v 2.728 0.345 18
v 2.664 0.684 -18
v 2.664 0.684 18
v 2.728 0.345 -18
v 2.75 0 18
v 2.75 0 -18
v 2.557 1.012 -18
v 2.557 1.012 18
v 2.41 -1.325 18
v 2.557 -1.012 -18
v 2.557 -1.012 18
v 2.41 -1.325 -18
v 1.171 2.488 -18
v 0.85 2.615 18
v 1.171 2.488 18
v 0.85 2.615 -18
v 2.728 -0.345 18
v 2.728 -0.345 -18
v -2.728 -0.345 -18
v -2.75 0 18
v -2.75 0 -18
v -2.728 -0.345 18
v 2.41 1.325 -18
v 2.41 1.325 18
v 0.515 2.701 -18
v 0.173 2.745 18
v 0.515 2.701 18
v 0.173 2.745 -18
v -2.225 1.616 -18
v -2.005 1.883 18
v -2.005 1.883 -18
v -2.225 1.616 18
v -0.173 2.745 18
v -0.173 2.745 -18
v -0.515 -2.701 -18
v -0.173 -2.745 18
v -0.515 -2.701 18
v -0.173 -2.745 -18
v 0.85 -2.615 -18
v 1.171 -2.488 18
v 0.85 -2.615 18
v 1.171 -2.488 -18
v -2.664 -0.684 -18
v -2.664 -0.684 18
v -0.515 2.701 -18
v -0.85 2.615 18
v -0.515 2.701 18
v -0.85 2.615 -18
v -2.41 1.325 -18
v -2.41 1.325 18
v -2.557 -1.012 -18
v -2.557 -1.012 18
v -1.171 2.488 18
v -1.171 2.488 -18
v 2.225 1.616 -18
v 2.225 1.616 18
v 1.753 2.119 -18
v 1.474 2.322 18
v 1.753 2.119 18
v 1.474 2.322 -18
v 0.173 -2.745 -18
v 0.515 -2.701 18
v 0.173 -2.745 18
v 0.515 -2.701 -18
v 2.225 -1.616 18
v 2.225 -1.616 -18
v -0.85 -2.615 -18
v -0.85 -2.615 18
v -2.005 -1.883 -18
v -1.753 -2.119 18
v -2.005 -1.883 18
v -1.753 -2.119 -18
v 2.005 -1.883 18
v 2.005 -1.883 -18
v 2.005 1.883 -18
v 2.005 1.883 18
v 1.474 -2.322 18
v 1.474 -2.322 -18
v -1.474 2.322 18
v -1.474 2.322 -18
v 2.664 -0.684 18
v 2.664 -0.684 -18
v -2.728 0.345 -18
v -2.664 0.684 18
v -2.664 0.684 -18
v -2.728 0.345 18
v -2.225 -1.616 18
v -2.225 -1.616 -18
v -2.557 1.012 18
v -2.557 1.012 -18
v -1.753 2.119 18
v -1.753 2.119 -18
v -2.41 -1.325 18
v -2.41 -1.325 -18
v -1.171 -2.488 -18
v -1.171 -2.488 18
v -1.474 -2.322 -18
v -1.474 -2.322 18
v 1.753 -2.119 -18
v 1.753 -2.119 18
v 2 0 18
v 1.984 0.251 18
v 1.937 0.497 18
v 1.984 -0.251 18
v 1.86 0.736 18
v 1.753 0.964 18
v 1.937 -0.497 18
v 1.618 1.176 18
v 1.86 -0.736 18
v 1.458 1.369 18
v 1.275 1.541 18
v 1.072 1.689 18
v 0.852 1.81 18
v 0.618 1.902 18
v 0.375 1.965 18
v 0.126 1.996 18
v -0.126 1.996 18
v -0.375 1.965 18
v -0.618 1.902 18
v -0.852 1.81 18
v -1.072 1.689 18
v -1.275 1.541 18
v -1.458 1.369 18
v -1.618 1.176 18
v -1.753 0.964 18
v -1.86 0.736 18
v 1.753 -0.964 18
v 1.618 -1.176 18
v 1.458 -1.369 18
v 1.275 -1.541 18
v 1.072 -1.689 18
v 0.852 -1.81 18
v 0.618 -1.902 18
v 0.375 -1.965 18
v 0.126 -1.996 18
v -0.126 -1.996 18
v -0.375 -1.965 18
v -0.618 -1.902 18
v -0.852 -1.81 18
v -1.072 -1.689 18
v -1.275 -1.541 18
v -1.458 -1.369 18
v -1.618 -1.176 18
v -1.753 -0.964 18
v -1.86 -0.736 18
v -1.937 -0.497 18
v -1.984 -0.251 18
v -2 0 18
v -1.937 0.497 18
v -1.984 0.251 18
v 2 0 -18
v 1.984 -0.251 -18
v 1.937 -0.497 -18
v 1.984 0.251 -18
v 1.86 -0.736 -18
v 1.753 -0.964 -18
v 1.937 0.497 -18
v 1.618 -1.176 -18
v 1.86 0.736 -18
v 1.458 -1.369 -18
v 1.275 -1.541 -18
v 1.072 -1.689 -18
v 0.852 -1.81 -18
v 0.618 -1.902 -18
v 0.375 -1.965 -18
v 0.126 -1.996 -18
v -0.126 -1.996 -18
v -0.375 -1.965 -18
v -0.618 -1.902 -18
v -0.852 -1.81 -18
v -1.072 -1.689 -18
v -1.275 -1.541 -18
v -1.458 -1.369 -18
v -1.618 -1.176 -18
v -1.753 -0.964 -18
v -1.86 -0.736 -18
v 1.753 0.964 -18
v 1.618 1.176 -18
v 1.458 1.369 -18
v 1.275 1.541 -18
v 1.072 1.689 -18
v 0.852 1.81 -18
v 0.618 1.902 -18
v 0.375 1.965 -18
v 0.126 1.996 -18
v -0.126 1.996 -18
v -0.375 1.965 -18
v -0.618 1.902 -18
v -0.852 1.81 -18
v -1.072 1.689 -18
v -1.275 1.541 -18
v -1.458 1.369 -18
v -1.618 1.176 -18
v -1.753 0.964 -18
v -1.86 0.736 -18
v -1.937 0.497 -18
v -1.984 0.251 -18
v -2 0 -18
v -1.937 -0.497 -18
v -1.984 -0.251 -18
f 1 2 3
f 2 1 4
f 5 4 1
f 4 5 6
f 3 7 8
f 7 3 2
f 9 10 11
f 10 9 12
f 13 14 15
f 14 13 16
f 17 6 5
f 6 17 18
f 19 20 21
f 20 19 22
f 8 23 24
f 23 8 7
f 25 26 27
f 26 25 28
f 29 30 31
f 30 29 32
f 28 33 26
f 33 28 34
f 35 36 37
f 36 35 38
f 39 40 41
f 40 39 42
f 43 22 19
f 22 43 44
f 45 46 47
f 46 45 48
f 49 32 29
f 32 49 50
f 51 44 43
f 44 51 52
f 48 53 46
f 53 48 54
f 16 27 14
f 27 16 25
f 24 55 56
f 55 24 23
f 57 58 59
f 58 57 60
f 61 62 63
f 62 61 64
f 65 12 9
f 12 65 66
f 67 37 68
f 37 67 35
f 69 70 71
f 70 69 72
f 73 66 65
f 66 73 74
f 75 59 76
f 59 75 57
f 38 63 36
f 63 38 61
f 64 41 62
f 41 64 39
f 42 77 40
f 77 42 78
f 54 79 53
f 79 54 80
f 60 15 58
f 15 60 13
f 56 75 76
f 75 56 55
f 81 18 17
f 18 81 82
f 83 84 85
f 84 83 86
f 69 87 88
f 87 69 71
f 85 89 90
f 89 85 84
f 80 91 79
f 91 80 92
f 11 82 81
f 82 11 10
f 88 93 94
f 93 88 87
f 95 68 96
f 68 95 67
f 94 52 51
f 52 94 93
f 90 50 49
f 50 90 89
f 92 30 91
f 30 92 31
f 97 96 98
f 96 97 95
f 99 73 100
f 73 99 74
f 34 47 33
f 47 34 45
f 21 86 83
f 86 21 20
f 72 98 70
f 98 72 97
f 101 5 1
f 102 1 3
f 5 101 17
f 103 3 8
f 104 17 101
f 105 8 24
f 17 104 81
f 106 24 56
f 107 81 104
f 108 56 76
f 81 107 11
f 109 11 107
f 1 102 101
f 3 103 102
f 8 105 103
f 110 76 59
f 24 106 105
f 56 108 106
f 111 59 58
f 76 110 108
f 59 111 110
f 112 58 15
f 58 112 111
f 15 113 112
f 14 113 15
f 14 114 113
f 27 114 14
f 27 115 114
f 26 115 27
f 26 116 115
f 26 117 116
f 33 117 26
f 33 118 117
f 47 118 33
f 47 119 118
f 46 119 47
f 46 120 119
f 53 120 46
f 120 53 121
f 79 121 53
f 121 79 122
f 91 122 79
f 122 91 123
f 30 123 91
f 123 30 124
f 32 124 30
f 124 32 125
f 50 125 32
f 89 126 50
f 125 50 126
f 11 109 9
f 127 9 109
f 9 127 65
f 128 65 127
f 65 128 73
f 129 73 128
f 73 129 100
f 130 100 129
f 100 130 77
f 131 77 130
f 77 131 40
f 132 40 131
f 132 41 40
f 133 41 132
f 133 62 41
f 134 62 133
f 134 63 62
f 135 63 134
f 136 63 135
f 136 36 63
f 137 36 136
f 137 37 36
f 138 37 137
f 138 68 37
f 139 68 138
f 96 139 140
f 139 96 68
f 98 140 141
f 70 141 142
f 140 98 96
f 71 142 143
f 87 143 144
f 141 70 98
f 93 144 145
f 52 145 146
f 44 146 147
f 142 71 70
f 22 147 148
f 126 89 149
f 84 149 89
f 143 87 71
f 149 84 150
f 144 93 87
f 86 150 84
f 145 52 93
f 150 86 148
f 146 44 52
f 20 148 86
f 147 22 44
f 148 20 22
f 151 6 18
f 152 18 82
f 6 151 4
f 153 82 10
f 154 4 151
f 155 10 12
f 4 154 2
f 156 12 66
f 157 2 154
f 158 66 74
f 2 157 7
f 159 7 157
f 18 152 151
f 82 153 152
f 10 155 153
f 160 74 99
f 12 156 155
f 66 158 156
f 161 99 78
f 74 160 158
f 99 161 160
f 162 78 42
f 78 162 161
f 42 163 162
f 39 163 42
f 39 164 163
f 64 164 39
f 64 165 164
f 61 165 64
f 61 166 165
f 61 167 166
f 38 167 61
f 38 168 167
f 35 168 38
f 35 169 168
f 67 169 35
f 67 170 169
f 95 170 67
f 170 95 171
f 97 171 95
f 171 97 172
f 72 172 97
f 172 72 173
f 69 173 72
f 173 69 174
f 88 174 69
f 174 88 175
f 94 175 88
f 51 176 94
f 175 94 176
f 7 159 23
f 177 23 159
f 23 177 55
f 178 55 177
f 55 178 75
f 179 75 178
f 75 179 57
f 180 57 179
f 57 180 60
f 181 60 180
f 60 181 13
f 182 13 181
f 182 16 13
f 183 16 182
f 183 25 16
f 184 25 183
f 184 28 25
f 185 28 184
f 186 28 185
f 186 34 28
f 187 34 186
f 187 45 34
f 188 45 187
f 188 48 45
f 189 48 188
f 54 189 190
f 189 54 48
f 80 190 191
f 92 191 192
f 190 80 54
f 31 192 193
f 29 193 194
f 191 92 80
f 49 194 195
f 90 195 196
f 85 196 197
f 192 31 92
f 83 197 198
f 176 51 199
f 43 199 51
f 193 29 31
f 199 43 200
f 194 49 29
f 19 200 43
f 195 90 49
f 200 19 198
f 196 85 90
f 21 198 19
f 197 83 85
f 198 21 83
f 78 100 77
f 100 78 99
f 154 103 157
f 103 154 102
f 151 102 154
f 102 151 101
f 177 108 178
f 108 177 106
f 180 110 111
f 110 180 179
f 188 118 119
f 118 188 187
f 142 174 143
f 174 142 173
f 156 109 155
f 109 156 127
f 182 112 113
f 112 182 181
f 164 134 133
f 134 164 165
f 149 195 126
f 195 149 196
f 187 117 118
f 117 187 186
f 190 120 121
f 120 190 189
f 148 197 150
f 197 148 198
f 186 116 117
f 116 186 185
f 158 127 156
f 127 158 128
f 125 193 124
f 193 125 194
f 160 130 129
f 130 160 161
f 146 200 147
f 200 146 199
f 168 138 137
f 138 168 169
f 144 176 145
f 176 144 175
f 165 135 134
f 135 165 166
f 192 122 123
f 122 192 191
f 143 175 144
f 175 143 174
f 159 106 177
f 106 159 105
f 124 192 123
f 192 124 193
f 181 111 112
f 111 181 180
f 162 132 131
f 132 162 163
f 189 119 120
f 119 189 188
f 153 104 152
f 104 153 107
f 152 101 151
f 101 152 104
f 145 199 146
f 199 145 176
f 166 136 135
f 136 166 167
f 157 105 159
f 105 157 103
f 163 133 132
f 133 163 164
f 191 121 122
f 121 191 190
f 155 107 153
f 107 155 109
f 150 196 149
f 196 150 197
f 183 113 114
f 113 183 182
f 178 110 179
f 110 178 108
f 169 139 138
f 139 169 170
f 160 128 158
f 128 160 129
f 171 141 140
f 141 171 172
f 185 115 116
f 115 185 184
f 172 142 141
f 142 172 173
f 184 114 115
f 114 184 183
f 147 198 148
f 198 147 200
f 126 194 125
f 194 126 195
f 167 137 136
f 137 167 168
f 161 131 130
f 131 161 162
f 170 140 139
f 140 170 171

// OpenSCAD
$fn = 50;


difference() {
	union() {
		translate(v = [0, 0, -18.0000000000]) {
			cylinder(h = 36, r = 2.7500000000);
		}
	}
	union() {
		translate(v = [0, 0, -100.0000000000]) {
			cylinder(h = 200, r = 2.0000000000);
		}
	}
}
